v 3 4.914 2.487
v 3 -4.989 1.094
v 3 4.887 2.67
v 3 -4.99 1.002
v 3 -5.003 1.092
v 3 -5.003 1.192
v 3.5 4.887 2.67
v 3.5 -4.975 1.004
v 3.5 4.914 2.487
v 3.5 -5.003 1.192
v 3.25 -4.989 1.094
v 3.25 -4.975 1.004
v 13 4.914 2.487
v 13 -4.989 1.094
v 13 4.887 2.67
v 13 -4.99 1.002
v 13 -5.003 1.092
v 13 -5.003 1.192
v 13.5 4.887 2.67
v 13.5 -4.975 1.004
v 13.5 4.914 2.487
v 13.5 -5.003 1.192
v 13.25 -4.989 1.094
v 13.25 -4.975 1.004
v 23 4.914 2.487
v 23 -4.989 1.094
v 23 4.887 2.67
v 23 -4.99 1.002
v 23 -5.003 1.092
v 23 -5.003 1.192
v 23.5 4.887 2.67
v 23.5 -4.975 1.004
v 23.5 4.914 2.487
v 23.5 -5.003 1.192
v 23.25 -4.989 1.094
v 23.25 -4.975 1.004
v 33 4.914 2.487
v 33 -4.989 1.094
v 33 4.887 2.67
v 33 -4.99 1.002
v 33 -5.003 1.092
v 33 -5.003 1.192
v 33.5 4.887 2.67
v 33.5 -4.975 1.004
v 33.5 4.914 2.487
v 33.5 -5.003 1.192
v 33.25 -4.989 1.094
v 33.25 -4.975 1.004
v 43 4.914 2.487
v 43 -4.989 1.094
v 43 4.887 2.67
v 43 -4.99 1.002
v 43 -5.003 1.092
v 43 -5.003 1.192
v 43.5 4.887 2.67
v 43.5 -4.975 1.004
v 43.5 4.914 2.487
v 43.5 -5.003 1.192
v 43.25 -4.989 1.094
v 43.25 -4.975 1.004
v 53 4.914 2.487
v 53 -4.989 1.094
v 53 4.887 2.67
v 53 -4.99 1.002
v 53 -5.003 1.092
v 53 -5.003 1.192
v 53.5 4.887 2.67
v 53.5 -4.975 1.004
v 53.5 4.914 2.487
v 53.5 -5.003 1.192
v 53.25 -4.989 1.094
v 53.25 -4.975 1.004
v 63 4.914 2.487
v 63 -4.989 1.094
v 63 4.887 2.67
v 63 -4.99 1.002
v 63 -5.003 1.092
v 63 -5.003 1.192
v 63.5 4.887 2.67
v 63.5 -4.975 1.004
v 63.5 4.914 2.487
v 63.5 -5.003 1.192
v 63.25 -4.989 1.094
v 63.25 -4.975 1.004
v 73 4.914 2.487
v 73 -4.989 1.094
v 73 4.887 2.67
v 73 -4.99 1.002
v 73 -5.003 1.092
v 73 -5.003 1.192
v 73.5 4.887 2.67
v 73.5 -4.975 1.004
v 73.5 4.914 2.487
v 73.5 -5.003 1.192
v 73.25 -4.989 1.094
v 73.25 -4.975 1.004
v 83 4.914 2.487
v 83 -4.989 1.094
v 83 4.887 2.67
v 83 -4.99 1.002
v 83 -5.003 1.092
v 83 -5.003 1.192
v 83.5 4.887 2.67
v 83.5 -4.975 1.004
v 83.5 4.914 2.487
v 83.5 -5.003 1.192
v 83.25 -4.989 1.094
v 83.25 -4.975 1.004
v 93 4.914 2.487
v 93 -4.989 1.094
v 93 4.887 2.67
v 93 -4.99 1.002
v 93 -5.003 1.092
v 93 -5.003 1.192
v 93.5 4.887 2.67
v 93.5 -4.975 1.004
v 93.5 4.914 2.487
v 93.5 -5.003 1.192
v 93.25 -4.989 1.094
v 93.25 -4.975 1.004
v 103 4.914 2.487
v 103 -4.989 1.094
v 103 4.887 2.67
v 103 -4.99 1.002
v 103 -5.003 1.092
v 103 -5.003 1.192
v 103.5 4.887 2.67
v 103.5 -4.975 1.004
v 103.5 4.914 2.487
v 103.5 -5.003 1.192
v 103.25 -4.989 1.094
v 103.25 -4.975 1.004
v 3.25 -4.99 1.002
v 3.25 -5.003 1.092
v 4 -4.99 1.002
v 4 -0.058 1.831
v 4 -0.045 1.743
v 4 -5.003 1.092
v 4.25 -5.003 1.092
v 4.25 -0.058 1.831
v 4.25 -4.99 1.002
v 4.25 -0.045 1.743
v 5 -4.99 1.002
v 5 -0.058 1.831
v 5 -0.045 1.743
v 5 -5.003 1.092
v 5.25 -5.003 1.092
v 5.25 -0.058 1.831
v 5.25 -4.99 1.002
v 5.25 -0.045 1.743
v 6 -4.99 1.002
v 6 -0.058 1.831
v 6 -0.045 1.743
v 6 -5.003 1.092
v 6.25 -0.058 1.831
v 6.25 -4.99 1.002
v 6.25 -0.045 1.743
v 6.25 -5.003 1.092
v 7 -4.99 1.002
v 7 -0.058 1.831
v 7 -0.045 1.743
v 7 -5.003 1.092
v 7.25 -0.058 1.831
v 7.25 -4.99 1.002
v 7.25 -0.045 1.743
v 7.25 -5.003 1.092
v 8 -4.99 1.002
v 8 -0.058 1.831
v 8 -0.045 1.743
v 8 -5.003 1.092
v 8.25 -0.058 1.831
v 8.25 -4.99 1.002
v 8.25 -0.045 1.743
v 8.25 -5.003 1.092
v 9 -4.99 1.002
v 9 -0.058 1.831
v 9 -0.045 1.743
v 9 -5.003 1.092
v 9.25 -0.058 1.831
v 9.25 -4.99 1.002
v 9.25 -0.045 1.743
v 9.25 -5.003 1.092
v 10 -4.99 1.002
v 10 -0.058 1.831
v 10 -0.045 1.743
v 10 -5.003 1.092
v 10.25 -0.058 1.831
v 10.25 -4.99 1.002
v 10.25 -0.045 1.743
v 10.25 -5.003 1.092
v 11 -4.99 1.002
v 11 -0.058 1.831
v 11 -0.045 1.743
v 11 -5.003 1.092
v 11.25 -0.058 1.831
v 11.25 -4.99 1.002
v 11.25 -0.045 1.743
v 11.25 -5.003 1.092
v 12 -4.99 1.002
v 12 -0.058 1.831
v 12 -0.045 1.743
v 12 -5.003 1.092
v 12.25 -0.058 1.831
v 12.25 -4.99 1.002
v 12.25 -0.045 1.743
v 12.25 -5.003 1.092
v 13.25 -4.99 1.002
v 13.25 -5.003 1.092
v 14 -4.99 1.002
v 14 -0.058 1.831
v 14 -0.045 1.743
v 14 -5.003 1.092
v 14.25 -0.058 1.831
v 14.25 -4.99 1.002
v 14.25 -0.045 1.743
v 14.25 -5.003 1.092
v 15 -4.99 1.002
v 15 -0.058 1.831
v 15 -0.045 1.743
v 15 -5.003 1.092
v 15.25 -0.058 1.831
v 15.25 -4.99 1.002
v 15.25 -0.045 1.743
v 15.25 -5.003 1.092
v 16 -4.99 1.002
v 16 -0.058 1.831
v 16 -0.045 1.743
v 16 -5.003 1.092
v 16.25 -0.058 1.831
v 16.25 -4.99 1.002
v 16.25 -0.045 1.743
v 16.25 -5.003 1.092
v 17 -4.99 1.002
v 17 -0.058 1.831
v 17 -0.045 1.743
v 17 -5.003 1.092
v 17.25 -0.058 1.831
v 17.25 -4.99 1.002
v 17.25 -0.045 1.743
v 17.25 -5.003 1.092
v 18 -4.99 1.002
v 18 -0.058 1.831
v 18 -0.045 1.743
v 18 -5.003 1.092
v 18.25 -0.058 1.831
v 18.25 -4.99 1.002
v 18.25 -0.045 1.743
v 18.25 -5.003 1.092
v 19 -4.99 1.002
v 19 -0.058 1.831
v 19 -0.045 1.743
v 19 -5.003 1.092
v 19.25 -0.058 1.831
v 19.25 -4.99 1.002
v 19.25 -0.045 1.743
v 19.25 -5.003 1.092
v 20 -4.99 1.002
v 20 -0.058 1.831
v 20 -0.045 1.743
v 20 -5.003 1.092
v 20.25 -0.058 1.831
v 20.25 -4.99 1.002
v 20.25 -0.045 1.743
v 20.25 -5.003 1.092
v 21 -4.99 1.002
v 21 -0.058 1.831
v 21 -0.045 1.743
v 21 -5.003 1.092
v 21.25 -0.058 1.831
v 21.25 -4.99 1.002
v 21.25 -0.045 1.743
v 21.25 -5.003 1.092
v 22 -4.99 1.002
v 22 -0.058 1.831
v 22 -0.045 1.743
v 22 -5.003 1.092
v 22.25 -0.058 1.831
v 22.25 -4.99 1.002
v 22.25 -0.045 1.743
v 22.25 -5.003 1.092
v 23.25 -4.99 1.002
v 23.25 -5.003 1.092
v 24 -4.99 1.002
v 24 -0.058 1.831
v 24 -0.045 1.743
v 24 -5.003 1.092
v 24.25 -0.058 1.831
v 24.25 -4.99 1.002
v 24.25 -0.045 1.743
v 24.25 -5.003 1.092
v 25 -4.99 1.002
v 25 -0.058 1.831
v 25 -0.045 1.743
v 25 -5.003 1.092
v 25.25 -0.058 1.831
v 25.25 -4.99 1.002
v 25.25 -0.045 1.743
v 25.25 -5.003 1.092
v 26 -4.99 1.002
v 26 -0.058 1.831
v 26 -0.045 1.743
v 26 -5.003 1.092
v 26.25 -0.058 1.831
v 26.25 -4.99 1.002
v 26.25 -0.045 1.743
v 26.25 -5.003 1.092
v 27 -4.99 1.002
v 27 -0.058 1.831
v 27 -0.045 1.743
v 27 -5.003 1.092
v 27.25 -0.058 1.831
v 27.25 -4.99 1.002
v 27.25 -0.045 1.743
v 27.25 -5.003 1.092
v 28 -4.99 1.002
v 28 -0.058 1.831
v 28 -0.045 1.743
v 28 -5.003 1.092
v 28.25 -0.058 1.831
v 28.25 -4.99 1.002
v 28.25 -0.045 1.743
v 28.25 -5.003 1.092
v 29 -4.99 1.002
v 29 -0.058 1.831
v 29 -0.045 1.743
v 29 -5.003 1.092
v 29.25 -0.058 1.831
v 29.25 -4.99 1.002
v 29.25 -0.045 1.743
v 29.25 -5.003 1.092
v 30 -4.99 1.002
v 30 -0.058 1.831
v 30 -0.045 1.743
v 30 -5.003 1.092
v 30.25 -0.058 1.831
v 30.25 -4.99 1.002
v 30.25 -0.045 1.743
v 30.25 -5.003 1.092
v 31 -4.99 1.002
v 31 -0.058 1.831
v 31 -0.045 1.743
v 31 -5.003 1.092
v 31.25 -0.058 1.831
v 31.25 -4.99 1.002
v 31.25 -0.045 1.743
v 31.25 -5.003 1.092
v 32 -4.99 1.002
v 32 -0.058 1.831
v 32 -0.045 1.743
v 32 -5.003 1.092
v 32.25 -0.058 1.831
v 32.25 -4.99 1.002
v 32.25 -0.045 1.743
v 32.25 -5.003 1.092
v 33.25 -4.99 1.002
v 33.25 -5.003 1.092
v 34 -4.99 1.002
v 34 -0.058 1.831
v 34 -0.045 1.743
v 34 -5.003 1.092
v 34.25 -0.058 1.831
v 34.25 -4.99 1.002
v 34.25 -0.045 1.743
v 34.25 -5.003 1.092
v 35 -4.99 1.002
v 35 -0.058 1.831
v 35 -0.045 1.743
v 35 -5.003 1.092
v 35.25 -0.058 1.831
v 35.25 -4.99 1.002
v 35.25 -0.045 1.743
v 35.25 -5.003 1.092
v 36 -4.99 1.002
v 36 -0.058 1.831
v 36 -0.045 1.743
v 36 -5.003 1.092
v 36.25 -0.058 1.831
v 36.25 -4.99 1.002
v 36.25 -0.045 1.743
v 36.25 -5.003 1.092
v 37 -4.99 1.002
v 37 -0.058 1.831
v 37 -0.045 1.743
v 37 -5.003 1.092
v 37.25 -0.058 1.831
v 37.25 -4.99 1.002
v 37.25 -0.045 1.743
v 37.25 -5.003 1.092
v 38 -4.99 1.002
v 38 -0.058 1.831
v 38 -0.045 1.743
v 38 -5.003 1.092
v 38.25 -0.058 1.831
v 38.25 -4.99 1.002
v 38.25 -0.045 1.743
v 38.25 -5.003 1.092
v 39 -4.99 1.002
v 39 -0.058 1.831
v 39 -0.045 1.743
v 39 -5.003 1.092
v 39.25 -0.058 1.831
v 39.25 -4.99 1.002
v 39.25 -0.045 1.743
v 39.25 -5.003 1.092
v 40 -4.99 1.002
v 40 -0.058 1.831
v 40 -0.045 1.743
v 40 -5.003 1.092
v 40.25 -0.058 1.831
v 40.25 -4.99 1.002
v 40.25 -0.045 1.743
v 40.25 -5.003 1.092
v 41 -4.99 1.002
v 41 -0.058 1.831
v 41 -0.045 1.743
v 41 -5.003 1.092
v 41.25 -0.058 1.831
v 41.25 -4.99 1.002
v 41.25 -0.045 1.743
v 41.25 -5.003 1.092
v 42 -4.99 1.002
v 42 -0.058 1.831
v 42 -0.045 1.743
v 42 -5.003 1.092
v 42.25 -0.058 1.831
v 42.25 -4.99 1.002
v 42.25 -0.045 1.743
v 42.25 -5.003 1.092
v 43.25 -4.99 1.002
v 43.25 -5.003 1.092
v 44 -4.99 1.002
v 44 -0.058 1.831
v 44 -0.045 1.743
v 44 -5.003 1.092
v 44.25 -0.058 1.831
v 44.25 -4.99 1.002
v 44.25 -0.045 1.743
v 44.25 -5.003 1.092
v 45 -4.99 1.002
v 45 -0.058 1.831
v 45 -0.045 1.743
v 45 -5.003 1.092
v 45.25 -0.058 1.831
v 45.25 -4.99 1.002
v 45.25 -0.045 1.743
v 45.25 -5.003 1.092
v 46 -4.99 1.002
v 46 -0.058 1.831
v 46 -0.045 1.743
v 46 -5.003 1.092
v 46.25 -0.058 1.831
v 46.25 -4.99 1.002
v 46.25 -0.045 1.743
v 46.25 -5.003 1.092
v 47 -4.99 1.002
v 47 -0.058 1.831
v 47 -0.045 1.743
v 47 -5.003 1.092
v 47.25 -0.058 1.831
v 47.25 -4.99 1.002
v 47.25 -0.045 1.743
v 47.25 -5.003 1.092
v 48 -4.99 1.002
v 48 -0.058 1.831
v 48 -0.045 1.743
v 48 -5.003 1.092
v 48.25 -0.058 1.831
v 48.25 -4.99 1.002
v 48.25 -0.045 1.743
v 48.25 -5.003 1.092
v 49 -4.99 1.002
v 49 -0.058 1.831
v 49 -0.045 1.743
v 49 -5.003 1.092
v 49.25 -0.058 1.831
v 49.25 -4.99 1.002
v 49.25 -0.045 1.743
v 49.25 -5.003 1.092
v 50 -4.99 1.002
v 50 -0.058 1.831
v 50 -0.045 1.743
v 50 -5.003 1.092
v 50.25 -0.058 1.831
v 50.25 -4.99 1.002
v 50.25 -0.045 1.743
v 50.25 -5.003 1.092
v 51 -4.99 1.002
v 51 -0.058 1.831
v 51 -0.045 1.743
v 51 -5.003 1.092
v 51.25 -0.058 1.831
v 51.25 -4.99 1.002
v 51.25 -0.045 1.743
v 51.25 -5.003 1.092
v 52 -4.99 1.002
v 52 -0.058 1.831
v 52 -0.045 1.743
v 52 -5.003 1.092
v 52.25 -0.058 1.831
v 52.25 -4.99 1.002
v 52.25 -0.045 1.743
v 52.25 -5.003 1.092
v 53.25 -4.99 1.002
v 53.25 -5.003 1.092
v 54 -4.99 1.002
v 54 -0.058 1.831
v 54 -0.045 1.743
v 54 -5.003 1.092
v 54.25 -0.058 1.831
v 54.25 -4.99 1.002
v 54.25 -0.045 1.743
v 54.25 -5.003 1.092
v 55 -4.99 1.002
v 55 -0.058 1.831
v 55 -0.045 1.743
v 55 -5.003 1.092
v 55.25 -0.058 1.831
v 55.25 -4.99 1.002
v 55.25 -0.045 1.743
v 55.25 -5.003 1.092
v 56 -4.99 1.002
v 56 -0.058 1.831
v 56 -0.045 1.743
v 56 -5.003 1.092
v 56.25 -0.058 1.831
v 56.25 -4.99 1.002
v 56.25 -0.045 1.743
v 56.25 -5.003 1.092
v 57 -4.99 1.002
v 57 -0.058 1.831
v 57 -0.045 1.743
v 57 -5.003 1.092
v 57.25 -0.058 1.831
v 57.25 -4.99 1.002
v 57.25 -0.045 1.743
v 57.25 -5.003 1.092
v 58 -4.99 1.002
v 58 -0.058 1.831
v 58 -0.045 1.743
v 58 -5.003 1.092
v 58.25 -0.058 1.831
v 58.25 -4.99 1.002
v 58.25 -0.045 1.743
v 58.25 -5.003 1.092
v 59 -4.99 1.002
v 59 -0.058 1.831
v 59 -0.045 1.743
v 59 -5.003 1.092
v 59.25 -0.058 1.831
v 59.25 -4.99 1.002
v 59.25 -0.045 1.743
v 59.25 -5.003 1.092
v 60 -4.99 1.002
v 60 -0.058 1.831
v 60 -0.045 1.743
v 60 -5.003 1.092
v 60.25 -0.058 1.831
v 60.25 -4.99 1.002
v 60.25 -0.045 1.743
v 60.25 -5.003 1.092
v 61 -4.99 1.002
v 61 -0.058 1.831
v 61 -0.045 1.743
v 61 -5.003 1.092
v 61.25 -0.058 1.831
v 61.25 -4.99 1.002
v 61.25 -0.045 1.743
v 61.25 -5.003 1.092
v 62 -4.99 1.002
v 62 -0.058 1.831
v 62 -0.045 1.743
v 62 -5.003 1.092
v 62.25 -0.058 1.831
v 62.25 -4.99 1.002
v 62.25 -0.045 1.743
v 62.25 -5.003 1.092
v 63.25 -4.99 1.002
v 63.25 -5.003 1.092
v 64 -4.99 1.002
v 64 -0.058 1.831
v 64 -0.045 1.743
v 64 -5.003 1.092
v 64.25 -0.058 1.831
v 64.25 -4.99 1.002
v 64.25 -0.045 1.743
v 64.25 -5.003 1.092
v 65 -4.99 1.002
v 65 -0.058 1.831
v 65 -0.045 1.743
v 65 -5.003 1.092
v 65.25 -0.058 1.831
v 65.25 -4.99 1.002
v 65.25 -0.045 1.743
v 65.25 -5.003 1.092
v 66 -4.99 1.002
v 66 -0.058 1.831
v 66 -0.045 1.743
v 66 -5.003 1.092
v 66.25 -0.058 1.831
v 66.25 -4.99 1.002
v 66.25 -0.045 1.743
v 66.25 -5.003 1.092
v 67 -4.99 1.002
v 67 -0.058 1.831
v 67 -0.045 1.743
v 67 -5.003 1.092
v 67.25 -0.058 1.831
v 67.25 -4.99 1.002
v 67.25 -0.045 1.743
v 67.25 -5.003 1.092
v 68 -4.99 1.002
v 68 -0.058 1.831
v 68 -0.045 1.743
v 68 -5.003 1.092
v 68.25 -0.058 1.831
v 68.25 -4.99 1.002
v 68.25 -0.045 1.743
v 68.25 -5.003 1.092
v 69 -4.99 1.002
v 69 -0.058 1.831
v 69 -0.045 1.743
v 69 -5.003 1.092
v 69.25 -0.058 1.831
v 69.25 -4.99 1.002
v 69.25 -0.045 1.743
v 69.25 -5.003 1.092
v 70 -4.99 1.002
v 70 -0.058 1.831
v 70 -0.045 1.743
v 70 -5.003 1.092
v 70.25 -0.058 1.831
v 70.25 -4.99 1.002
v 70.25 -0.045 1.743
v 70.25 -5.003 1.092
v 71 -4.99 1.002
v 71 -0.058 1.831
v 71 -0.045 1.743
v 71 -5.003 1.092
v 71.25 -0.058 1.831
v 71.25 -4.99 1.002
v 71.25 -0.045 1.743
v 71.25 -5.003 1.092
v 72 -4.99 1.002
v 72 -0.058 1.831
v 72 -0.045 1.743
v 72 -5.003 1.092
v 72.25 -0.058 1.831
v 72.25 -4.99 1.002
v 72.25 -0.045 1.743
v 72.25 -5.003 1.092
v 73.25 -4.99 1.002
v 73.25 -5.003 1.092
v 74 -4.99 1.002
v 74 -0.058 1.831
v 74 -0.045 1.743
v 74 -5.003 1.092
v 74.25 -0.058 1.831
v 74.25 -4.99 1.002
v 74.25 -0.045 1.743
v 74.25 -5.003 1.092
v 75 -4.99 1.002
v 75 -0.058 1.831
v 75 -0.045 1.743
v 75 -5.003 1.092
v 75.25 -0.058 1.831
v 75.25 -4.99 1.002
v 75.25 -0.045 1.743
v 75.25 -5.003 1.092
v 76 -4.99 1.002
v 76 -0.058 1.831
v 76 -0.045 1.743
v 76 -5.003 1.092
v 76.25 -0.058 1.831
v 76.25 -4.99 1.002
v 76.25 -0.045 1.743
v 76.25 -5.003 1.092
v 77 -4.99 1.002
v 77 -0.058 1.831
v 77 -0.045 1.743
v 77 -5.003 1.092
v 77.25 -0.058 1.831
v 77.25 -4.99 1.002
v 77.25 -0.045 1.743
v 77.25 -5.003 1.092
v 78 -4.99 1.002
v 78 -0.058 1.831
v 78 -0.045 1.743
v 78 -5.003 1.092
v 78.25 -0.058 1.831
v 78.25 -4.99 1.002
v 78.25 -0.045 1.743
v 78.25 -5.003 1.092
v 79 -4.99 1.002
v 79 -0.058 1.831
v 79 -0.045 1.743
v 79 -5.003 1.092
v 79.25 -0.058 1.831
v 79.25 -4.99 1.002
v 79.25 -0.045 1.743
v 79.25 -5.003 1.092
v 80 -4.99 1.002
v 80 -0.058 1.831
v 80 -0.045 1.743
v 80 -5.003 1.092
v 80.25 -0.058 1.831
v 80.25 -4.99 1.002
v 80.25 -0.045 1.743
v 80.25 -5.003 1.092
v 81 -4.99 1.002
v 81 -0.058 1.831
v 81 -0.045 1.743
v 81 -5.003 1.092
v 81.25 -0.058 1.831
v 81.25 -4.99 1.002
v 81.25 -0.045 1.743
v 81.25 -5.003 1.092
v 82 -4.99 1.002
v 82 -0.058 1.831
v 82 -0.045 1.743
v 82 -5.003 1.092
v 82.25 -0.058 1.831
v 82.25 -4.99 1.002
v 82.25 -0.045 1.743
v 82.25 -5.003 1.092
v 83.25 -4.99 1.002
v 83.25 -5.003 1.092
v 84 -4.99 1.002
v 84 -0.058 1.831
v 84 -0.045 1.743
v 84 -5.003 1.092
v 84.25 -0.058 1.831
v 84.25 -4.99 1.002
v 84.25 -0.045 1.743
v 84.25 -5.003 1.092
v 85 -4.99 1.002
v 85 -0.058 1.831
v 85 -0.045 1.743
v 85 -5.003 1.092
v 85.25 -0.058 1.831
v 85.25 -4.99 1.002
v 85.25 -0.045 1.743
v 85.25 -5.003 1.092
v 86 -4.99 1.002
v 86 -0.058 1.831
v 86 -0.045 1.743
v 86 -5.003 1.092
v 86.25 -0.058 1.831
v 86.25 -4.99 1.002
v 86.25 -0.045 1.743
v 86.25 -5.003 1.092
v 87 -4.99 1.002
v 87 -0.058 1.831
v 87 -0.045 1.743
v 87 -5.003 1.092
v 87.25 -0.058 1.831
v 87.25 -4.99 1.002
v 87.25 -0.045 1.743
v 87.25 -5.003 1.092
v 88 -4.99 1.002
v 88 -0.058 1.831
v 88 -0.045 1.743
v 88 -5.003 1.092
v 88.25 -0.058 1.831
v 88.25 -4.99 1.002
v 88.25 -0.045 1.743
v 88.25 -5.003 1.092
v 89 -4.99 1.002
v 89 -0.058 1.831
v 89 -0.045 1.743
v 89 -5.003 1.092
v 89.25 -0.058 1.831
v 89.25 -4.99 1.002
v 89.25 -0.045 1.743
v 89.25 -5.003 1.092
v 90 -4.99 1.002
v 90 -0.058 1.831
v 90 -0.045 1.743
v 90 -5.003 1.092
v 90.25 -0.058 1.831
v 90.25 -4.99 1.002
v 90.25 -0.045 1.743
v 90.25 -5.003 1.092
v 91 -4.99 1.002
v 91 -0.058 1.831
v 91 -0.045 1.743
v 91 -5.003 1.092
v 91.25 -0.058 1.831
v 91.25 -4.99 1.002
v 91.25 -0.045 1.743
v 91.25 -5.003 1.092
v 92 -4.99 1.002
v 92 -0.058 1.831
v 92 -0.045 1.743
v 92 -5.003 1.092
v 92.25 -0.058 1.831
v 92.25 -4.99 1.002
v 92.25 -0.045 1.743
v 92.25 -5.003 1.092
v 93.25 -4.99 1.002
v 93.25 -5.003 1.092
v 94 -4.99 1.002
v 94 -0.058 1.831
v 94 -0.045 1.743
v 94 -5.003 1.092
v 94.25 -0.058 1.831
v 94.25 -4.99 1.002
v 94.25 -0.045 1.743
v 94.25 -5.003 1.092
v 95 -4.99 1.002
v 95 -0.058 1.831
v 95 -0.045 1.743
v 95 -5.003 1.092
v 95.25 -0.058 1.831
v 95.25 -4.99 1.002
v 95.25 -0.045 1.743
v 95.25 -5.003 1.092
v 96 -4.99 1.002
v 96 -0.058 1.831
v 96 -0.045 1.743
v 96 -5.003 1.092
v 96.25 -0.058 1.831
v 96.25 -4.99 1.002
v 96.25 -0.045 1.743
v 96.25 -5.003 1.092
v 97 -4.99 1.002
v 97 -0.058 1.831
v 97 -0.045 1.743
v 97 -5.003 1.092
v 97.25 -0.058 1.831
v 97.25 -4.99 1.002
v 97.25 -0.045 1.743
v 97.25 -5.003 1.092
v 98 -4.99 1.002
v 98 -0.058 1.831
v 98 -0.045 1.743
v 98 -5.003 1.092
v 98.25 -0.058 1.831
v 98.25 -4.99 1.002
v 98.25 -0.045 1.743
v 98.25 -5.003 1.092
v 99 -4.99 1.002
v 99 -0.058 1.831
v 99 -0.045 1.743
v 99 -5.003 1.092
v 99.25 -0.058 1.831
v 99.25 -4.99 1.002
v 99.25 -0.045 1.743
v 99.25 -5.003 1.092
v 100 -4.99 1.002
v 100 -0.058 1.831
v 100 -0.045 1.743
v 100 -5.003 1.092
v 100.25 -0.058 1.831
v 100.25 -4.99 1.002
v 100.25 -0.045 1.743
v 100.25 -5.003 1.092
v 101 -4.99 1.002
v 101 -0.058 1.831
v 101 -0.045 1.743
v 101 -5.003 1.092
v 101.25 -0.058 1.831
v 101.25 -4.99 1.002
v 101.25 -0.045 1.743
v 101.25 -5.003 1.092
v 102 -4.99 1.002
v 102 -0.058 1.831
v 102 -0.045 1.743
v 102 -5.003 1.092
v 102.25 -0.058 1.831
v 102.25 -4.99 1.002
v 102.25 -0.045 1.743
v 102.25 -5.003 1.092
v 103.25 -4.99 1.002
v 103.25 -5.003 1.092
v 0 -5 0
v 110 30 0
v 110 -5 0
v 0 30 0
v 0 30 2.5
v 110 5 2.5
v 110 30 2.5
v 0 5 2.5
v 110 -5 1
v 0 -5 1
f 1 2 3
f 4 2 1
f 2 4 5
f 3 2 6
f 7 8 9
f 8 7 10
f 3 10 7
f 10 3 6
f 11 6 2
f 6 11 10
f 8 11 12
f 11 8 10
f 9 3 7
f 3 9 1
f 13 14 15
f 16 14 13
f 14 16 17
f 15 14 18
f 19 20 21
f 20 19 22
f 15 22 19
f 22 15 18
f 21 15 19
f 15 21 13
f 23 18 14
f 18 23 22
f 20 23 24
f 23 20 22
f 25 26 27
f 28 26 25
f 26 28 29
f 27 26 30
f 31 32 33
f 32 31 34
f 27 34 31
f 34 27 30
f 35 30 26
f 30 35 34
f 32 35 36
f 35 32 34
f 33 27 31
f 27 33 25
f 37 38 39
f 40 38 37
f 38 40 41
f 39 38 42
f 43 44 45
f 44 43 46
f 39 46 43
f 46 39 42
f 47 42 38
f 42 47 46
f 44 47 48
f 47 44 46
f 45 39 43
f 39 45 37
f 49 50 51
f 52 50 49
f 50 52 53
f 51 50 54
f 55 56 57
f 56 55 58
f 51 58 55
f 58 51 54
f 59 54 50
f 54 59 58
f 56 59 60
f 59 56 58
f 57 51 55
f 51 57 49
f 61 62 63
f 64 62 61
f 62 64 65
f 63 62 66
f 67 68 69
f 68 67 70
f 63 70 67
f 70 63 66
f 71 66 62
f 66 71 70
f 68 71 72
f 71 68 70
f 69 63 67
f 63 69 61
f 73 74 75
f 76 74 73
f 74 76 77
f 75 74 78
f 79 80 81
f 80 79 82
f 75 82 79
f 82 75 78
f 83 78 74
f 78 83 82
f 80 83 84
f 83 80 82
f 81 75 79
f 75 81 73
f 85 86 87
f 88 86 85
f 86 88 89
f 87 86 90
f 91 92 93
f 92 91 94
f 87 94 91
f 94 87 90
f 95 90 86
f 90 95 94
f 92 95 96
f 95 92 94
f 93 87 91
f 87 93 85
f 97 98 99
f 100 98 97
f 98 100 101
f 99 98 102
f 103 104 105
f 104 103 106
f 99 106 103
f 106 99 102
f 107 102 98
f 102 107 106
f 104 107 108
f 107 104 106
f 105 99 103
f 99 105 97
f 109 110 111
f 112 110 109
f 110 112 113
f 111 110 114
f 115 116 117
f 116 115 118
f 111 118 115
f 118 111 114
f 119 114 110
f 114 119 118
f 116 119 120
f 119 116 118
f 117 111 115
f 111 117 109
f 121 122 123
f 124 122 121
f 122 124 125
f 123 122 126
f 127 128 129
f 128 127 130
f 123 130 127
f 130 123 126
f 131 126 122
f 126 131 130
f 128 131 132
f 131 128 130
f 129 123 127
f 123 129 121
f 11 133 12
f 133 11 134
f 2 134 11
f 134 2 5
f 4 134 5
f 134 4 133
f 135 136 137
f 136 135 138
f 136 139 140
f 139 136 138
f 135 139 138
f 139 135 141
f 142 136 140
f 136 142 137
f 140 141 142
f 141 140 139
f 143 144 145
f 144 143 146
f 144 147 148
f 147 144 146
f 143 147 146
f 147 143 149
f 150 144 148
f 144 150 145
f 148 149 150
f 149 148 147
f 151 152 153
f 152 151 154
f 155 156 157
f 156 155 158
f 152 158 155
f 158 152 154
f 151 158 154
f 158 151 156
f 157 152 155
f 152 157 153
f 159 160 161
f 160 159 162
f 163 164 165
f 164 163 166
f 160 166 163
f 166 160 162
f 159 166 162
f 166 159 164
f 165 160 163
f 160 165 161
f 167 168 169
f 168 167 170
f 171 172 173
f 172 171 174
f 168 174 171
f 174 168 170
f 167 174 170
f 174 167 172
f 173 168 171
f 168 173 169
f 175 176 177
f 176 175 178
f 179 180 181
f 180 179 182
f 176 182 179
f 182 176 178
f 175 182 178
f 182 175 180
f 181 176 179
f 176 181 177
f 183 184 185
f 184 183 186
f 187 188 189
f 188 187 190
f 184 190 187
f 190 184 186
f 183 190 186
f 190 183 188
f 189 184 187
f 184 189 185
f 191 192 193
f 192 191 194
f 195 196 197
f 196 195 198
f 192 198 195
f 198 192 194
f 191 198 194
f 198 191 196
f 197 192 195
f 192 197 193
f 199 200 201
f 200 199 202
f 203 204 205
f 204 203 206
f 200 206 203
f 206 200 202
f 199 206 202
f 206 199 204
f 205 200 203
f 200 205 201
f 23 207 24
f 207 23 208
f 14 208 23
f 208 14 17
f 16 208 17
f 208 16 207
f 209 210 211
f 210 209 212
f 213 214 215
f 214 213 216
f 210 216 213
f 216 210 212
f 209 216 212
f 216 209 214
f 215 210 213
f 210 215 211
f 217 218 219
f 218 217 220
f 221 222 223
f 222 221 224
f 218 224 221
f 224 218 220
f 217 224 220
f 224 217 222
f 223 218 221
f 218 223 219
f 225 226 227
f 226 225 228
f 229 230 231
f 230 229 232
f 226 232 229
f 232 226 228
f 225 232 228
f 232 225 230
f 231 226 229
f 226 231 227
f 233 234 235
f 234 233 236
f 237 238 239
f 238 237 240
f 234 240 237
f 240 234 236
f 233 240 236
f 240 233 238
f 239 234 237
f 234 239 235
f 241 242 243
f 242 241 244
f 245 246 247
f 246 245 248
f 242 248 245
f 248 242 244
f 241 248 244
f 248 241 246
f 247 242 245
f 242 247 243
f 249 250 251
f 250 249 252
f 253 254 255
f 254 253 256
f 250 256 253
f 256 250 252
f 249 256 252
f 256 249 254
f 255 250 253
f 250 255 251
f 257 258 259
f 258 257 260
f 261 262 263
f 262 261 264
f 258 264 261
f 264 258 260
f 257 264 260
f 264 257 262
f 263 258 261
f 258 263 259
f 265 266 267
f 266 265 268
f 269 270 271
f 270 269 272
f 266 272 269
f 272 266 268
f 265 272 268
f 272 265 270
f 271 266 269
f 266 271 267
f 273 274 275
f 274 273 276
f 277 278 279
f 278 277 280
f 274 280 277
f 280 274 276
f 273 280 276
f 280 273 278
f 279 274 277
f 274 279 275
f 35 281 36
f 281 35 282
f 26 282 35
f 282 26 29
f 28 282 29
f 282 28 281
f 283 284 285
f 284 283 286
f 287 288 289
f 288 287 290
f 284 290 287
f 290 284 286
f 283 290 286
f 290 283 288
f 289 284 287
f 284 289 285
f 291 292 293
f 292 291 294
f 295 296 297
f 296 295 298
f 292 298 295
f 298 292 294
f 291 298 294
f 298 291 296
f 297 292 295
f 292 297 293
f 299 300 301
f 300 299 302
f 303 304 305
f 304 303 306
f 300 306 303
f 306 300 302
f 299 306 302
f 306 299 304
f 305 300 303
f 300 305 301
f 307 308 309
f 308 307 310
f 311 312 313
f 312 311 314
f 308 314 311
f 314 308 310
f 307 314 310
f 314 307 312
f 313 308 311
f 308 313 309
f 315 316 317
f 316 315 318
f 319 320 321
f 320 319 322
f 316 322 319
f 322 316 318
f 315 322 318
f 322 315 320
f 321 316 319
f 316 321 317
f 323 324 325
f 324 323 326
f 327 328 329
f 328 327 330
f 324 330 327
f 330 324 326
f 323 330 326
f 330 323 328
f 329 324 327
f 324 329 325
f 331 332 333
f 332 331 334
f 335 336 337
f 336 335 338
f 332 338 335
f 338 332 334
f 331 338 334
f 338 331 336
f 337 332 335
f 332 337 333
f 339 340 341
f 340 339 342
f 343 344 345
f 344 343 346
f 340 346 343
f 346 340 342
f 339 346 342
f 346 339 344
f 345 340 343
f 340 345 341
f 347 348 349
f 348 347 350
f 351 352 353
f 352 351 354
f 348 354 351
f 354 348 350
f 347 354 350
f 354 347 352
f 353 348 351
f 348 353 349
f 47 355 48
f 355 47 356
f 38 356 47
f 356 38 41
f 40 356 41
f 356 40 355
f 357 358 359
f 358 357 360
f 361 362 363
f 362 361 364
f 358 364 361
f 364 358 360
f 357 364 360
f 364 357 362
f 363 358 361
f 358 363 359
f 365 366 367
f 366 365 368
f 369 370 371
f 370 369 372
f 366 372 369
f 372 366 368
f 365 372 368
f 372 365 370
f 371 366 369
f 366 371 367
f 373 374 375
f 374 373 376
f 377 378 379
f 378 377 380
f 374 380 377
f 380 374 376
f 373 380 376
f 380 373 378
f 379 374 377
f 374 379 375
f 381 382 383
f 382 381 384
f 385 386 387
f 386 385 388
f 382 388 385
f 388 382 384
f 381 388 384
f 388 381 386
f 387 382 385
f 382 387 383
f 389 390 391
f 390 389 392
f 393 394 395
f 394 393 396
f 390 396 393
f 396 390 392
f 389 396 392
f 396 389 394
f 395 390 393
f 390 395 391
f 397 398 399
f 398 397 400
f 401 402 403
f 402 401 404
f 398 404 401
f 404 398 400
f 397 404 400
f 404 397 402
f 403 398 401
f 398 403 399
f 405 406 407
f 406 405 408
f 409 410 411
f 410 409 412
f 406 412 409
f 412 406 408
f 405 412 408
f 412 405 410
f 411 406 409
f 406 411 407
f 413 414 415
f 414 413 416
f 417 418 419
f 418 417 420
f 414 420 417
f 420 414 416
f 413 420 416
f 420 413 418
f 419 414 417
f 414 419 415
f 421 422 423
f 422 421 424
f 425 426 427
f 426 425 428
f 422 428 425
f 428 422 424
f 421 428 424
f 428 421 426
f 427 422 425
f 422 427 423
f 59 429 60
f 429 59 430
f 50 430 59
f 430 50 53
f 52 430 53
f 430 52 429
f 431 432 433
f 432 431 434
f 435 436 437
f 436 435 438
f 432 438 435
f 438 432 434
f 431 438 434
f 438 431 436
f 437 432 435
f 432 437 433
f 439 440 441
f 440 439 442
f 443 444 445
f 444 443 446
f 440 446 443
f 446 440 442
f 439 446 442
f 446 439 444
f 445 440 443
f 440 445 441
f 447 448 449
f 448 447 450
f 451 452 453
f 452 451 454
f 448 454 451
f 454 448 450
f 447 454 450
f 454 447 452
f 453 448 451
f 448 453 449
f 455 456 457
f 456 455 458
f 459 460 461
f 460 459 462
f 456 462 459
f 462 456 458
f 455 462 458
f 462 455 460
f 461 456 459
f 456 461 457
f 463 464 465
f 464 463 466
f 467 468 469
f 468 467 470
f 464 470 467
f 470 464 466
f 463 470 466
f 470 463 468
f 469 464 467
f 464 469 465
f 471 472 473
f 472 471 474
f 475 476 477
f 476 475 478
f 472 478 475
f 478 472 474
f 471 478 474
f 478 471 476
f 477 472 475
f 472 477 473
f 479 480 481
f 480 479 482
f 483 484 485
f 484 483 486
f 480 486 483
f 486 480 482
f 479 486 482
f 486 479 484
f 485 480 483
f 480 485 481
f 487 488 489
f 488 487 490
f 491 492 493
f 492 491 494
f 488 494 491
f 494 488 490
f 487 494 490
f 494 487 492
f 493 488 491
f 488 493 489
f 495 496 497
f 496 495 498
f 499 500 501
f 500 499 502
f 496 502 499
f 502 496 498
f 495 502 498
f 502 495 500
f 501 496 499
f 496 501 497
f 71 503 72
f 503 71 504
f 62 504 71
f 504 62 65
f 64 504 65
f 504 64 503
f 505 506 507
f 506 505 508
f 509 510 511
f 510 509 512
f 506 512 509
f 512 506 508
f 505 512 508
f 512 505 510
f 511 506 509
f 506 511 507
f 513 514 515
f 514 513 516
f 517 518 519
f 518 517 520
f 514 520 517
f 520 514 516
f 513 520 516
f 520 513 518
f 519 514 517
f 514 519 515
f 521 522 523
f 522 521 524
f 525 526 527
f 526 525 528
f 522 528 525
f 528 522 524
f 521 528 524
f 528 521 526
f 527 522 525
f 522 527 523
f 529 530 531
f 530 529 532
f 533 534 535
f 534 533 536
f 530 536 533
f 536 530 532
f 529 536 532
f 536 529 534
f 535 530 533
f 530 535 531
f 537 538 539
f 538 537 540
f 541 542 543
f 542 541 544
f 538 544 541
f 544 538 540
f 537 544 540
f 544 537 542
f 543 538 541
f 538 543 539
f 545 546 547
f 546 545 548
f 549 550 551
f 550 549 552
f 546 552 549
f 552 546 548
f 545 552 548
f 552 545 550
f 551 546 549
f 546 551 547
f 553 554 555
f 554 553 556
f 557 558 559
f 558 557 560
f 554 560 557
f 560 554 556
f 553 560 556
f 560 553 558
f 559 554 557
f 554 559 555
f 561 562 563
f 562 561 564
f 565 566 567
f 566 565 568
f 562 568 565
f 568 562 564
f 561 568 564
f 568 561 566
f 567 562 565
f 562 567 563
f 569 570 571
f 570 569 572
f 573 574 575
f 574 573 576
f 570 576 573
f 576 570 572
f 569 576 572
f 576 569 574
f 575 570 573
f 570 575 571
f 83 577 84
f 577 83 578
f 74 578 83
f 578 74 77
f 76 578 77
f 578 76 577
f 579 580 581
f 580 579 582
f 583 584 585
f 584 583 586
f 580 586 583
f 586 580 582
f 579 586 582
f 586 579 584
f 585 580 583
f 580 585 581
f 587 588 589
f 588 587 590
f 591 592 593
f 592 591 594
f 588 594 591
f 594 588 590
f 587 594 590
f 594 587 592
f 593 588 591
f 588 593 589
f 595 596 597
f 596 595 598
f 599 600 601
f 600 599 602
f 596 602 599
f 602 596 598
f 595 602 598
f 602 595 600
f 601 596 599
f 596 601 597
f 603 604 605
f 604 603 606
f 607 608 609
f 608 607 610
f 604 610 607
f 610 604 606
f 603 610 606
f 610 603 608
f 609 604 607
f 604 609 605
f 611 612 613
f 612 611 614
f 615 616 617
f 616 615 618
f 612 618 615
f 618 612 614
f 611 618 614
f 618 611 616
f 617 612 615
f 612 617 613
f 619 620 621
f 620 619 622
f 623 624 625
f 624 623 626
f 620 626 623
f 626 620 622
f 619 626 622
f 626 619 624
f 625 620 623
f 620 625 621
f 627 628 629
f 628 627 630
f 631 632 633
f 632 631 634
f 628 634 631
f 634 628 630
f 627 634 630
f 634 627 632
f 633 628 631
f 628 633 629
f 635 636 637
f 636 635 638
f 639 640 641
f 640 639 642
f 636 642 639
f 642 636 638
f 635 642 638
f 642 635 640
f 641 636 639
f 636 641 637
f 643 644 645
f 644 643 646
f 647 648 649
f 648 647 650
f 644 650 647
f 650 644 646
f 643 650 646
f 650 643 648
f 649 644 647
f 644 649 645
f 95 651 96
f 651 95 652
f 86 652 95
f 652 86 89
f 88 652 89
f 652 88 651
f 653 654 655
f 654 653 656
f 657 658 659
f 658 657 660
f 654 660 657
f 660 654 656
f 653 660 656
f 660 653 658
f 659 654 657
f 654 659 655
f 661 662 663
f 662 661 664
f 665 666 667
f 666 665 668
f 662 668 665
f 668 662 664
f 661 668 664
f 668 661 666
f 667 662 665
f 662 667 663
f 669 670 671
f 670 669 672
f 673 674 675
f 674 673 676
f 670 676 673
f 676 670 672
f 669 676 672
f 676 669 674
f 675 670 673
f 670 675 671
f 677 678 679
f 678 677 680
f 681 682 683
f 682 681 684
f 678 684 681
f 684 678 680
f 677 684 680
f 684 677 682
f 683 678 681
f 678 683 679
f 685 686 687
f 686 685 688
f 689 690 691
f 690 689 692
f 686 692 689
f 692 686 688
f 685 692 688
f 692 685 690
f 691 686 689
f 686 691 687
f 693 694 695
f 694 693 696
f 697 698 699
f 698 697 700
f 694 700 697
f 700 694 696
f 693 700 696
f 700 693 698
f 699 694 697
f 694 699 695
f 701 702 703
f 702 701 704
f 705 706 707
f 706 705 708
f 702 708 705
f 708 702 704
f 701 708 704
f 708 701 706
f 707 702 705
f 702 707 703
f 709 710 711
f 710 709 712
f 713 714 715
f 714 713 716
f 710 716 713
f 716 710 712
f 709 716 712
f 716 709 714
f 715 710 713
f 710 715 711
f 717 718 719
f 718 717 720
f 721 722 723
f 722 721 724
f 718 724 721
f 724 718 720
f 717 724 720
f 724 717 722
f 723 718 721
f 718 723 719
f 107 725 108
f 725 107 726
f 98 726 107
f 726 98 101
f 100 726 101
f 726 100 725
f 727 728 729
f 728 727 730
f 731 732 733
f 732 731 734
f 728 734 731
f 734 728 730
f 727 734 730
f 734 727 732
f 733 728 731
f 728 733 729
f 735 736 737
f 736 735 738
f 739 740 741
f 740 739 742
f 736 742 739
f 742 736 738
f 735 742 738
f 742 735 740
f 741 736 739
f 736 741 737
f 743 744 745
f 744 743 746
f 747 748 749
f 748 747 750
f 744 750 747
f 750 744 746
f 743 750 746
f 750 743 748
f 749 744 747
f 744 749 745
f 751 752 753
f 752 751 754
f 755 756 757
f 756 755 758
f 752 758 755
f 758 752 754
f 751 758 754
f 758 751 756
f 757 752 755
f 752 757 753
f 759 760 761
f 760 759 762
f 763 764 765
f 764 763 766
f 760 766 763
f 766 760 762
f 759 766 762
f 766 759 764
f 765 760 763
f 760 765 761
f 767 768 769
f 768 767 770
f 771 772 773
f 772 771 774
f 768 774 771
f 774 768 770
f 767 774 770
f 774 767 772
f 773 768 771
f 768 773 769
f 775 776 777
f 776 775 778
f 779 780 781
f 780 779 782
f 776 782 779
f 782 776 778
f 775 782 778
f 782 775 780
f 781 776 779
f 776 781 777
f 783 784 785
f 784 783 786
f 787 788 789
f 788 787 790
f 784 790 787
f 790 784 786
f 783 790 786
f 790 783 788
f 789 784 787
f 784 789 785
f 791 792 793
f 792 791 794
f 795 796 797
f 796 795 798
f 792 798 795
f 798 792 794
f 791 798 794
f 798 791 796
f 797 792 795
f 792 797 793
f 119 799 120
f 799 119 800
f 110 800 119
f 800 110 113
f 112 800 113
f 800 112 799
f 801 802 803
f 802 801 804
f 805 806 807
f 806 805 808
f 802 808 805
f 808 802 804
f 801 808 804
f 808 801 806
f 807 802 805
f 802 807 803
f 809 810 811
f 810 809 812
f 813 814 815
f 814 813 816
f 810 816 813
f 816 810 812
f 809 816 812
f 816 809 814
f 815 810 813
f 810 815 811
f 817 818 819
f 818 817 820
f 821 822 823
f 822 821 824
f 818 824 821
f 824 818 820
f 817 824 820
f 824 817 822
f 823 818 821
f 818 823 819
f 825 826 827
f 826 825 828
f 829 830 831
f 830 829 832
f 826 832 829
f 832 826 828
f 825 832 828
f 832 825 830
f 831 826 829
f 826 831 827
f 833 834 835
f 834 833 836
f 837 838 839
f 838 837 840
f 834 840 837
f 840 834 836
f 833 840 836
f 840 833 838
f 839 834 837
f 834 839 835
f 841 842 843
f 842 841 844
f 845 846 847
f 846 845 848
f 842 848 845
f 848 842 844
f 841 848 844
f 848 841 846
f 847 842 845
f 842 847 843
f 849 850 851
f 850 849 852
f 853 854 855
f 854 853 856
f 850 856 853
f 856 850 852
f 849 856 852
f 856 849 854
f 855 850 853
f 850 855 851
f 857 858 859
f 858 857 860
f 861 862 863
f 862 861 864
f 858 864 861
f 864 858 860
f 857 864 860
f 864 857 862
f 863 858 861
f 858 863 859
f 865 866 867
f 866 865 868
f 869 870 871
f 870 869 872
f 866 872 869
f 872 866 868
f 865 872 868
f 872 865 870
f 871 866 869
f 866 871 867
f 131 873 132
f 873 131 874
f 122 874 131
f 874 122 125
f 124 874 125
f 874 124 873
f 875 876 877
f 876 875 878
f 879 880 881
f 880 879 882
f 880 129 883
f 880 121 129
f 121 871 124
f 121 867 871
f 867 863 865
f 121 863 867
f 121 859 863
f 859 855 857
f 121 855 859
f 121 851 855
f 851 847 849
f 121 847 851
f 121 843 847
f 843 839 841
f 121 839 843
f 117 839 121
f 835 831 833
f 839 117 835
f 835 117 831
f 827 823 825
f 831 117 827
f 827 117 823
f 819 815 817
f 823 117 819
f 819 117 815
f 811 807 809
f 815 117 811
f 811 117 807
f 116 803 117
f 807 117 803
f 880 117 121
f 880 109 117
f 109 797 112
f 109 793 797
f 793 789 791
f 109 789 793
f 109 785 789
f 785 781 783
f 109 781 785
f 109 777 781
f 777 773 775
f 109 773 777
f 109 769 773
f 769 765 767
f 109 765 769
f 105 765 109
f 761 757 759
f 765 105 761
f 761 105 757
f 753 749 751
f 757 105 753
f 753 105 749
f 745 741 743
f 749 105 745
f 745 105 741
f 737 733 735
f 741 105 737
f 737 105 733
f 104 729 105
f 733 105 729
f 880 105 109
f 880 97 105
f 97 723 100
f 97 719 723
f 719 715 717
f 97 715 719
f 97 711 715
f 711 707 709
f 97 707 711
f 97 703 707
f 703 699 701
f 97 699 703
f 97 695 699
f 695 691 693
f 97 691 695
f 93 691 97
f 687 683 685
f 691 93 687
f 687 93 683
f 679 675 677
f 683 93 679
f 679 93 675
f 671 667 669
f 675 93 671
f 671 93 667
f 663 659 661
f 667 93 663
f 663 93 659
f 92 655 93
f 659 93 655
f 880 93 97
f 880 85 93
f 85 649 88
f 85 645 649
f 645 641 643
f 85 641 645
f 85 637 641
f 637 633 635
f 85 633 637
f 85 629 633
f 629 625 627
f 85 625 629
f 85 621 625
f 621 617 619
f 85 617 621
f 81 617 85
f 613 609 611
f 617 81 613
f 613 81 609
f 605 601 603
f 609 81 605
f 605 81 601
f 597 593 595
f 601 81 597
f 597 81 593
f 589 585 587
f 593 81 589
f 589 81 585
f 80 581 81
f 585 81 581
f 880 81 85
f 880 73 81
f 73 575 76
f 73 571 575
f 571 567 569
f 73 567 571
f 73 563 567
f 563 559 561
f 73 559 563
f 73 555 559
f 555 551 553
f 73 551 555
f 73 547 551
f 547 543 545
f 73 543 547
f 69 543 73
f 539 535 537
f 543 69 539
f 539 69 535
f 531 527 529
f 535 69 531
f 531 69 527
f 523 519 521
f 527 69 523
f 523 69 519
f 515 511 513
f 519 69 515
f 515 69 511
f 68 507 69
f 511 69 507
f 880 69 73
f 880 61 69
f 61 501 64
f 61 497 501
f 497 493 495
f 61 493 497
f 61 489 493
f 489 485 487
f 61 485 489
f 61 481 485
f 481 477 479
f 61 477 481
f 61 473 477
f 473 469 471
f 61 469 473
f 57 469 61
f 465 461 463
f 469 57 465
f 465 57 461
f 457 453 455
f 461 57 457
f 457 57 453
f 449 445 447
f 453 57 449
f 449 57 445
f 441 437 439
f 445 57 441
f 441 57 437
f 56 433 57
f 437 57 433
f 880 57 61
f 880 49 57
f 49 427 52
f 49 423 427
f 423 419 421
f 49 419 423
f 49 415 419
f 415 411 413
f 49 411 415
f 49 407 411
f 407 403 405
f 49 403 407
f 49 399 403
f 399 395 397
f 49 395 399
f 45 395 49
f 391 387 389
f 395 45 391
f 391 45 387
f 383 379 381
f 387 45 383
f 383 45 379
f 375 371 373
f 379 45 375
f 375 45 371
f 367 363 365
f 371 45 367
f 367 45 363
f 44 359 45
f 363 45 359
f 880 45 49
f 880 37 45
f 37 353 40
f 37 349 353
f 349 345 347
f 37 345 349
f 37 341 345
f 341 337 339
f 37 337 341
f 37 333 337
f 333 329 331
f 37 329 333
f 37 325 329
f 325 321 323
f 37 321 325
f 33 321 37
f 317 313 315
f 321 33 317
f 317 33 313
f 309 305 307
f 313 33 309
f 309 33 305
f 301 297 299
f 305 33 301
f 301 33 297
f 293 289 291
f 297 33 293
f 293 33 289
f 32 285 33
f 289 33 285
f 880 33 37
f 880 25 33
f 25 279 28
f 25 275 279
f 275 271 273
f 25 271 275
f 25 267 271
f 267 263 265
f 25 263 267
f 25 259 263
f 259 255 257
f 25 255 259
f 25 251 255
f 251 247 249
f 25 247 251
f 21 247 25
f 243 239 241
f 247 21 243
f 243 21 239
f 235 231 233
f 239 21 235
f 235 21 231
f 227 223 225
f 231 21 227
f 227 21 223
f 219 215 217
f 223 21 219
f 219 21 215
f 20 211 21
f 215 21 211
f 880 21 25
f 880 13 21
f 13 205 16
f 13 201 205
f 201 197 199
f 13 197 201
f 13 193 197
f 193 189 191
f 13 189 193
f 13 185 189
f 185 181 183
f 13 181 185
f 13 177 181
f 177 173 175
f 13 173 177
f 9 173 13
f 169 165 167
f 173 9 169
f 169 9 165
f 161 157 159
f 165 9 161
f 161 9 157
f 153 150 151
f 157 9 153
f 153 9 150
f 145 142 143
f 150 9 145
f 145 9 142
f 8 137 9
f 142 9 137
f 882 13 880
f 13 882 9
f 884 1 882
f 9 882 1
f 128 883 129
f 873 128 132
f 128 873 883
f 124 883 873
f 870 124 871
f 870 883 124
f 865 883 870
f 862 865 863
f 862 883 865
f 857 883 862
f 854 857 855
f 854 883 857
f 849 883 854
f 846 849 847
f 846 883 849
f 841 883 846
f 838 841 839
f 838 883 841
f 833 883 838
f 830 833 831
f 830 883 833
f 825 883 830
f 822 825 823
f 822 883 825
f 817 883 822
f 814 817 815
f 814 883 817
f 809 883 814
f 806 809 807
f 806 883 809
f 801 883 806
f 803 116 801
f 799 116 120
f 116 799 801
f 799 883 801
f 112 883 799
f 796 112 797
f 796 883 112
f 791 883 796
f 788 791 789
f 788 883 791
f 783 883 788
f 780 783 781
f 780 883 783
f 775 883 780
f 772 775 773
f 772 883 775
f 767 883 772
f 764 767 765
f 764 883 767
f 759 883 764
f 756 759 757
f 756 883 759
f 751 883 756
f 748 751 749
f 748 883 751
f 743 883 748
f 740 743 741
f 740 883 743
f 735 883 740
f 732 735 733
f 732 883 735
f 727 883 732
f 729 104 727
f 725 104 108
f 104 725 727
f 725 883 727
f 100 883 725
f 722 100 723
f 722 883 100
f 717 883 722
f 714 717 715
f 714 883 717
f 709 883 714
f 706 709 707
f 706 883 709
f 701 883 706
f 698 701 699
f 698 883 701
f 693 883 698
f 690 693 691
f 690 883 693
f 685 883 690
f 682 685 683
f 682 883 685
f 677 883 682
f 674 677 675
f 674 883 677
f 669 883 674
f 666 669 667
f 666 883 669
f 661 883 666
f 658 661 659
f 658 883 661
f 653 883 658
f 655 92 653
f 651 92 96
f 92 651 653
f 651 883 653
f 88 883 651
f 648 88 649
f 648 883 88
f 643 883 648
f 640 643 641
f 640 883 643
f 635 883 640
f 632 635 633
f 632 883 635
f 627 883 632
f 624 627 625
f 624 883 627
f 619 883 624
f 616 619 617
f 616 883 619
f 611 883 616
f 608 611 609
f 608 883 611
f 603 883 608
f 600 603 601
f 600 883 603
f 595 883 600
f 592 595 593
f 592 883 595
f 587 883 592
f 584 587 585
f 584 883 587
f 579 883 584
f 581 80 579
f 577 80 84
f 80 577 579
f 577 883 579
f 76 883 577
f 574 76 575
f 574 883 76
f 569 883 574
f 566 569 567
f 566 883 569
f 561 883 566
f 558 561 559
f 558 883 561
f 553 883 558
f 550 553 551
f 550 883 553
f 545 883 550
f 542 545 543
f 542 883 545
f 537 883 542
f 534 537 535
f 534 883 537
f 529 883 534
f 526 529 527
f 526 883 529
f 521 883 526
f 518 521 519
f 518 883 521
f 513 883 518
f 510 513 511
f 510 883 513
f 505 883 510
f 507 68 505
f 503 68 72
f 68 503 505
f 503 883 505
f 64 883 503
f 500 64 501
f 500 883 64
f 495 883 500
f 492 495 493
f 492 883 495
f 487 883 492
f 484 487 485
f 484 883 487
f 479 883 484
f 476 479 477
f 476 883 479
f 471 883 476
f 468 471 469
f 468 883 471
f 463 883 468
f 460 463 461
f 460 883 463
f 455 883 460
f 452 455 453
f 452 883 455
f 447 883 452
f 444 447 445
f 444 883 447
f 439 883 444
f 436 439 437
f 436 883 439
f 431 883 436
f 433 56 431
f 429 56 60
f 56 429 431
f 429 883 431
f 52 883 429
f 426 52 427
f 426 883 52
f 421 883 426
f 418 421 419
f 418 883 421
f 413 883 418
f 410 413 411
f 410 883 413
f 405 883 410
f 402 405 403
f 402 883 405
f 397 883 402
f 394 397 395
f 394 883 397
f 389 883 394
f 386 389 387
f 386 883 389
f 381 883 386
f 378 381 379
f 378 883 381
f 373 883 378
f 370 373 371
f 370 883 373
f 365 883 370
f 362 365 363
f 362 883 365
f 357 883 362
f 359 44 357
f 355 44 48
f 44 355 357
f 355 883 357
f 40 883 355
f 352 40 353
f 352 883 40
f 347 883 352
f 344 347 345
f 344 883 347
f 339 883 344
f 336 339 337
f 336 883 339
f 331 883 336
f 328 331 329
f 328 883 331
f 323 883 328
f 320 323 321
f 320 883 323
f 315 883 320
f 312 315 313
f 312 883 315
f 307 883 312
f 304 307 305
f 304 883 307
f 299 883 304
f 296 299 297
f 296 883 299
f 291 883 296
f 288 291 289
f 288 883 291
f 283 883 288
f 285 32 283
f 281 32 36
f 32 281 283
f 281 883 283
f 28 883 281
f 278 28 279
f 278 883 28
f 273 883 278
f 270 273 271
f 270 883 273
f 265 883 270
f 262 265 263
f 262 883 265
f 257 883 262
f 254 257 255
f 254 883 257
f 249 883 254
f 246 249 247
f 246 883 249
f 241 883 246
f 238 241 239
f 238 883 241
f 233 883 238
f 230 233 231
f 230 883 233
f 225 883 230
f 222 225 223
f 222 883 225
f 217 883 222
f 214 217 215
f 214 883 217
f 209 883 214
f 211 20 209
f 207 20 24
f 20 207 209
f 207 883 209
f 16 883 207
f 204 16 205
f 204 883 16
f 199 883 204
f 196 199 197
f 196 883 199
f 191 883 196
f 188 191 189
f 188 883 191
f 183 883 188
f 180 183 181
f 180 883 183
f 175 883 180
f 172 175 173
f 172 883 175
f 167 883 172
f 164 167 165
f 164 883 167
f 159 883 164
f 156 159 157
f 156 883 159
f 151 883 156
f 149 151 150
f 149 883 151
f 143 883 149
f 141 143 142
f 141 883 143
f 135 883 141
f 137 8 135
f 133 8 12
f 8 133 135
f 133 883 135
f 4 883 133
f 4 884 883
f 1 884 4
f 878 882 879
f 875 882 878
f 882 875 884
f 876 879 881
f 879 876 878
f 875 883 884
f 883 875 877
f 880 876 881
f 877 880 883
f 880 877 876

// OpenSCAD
//customizable ruler by Stu121

use <write/Write.scad>

RulerLength=10;// [1:50]
RulerText="Roy sin linjal!";
FontSize=8;
TextX=3;
TextY=18;
TextHeight=1;
NumberSize=7;//[1:15]
NumberOffset=0;//[0:3]

difference() {
    hull() {
        translate([0,5,0]) cube([(RulerLength*10)+10,25,2.5]);
        translate([0,-5,0])  cube([(RulerLength*10)+10,1,1]);
    }
}

for (i=[1:1:RulerLength]) {
    if (i > 9) {
        translate([(i*10)-2+NumberOffset,5.5,1]) write(str(i),h=NumberSize,t=2); 
    } else
        translate([(i*10)+NumberOffset,5.5,1]) write(str(i),h=NumberSize,t=2); 
}
translate([1,5.5,1]) write("CM",h=5,t=2); 


for (i=[0:10:RulerLength*10]){  
translate([i+3,-4.9,0.5]) rotate([8.5,0,0]) cube([.5,10,.7]);
}

for (i=[0:1:RulerLength*10]){   //embosed ruler lines
translate([i+3,-4.9,0.4]) rotate([8.5,0,0]) cube([.25,5,.7]);
}

translate([TextX,TextY,TextHeight])
    write(RulerText,h=FontSize,t=2); 
